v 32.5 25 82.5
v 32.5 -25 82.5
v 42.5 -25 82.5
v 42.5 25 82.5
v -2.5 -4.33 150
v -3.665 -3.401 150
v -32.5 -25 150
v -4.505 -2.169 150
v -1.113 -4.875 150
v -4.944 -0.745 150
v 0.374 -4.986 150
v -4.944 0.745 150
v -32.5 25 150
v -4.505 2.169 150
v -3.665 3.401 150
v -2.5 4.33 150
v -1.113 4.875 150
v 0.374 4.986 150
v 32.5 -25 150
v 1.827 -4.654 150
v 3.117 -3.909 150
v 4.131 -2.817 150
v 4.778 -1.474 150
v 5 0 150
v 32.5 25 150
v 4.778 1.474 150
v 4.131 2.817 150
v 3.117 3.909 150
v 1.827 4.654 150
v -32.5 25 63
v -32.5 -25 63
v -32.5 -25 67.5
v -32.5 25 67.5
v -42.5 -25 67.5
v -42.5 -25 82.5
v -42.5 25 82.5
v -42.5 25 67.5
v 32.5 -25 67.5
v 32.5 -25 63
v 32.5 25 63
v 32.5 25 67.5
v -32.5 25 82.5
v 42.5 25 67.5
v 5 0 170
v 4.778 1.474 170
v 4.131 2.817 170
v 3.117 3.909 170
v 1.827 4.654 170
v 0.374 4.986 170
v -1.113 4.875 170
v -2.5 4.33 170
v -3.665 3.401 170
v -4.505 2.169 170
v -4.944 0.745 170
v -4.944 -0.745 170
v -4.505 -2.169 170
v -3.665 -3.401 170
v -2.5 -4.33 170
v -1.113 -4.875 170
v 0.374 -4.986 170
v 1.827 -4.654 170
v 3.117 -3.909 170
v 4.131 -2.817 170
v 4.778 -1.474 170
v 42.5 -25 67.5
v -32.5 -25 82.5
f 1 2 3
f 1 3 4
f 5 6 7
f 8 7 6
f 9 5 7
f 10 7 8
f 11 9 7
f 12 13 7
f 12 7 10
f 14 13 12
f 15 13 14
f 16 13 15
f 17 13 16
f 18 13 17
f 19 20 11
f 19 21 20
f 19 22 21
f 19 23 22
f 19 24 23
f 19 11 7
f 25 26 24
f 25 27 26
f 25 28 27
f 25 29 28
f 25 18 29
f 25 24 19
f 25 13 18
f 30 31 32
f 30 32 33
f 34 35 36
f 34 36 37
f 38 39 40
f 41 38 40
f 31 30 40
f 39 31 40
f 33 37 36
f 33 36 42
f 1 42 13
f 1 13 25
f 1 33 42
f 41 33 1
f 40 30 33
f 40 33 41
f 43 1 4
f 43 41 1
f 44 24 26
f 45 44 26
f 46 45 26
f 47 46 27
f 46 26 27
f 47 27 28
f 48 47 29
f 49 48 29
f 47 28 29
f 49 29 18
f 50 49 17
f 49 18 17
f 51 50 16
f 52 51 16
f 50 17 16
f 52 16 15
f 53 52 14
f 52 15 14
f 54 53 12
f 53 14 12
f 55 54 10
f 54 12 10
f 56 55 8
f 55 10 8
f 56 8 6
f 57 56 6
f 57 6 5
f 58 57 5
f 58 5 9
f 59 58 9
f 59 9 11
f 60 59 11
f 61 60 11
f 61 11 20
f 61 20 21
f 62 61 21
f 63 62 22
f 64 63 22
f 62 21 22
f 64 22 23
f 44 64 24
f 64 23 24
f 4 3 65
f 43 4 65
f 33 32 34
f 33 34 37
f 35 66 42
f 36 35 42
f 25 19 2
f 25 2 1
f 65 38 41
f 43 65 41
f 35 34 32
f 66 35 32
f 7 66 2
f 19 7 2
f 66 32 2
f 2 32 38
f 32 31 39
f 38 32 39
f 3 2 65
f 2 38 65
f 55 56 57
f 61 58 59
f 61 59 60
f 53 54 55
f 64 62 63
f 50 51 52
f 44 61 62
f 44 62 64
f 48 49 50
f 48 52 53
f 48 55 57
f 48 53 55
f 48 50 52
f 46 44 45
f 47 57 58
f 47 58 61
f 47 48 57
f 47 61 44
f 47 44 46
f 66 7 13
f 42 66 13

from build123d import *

# Parameters (mm, degrees)
SKETCH1_W           = 65
SKETCH1_H           = 50
BOSS_EXTRUDE1_DEPTH = 150
SKETCH2_W           = 15
SKETCH2_H           = 50
BOSS_EXTRUDE2_DEPTH = 10
SKETCH3_R           = 5
BOSS_EXTRUDE3_DEPTH = 20
SKETCH4_W           = 65
SKETCH4_H           = 63
CUT_EXTRUDE1_DEPTH  = 183.225821441


with BuildPart() as part:
    # Sketch1 → Boss-Extrude1 (new body)
    with BuildSketch(Plane.XY):
        Rectangle(SKETCH1_W, SKETCH1_H)
    extrude(amount=BOSS_EXTRUDE1_DEPTH)

    # Sketch2 → Boss-Extrude2 (add)
    with BuildSketch(Plane(origin=(32.5, 0, 0), x_dir=(0, 0, -1), z_dir=(1, 0, 0))):
        with Locations((-75, 0)):
            Rectangle(SKETCH2_W, SKETCH2_H)
    boss_extrude2 = extrude(amount=BOSS_EXTRUDE2_DEPTH)

    # Mirror1: Boss-Extrude2 across plane
    add(boss_extrude2.mirror(Plane(origin=(0, 0, 0), x_dir=(0, 0, 1), z_dir=(1, 0, 0))))

    # Sketch3 → Boss-Extrude3 (add)
    with BuildSketch(Plane.XY.offset(150)):
        Circle(SKETCH3_R)
    extrude(amount=BOSS_EXTRUDE3_DEPTH)

    # Sketch4 → Cut-Extrude1 (cut, through all)
    with BuildSketch(Plane(origin=(0, 25, 0), x_dir=(1, 0, 0), z_dir=(0, 1, 0))):
        with Locations((0, -31.5)):
            Rectangle(SKETCH4_W, SKETCH4_H)
    extrude(amount=-CUT_EXTRUDE1_DEPTH, mode=Mode.SUBTRACT)


solid = part.part
